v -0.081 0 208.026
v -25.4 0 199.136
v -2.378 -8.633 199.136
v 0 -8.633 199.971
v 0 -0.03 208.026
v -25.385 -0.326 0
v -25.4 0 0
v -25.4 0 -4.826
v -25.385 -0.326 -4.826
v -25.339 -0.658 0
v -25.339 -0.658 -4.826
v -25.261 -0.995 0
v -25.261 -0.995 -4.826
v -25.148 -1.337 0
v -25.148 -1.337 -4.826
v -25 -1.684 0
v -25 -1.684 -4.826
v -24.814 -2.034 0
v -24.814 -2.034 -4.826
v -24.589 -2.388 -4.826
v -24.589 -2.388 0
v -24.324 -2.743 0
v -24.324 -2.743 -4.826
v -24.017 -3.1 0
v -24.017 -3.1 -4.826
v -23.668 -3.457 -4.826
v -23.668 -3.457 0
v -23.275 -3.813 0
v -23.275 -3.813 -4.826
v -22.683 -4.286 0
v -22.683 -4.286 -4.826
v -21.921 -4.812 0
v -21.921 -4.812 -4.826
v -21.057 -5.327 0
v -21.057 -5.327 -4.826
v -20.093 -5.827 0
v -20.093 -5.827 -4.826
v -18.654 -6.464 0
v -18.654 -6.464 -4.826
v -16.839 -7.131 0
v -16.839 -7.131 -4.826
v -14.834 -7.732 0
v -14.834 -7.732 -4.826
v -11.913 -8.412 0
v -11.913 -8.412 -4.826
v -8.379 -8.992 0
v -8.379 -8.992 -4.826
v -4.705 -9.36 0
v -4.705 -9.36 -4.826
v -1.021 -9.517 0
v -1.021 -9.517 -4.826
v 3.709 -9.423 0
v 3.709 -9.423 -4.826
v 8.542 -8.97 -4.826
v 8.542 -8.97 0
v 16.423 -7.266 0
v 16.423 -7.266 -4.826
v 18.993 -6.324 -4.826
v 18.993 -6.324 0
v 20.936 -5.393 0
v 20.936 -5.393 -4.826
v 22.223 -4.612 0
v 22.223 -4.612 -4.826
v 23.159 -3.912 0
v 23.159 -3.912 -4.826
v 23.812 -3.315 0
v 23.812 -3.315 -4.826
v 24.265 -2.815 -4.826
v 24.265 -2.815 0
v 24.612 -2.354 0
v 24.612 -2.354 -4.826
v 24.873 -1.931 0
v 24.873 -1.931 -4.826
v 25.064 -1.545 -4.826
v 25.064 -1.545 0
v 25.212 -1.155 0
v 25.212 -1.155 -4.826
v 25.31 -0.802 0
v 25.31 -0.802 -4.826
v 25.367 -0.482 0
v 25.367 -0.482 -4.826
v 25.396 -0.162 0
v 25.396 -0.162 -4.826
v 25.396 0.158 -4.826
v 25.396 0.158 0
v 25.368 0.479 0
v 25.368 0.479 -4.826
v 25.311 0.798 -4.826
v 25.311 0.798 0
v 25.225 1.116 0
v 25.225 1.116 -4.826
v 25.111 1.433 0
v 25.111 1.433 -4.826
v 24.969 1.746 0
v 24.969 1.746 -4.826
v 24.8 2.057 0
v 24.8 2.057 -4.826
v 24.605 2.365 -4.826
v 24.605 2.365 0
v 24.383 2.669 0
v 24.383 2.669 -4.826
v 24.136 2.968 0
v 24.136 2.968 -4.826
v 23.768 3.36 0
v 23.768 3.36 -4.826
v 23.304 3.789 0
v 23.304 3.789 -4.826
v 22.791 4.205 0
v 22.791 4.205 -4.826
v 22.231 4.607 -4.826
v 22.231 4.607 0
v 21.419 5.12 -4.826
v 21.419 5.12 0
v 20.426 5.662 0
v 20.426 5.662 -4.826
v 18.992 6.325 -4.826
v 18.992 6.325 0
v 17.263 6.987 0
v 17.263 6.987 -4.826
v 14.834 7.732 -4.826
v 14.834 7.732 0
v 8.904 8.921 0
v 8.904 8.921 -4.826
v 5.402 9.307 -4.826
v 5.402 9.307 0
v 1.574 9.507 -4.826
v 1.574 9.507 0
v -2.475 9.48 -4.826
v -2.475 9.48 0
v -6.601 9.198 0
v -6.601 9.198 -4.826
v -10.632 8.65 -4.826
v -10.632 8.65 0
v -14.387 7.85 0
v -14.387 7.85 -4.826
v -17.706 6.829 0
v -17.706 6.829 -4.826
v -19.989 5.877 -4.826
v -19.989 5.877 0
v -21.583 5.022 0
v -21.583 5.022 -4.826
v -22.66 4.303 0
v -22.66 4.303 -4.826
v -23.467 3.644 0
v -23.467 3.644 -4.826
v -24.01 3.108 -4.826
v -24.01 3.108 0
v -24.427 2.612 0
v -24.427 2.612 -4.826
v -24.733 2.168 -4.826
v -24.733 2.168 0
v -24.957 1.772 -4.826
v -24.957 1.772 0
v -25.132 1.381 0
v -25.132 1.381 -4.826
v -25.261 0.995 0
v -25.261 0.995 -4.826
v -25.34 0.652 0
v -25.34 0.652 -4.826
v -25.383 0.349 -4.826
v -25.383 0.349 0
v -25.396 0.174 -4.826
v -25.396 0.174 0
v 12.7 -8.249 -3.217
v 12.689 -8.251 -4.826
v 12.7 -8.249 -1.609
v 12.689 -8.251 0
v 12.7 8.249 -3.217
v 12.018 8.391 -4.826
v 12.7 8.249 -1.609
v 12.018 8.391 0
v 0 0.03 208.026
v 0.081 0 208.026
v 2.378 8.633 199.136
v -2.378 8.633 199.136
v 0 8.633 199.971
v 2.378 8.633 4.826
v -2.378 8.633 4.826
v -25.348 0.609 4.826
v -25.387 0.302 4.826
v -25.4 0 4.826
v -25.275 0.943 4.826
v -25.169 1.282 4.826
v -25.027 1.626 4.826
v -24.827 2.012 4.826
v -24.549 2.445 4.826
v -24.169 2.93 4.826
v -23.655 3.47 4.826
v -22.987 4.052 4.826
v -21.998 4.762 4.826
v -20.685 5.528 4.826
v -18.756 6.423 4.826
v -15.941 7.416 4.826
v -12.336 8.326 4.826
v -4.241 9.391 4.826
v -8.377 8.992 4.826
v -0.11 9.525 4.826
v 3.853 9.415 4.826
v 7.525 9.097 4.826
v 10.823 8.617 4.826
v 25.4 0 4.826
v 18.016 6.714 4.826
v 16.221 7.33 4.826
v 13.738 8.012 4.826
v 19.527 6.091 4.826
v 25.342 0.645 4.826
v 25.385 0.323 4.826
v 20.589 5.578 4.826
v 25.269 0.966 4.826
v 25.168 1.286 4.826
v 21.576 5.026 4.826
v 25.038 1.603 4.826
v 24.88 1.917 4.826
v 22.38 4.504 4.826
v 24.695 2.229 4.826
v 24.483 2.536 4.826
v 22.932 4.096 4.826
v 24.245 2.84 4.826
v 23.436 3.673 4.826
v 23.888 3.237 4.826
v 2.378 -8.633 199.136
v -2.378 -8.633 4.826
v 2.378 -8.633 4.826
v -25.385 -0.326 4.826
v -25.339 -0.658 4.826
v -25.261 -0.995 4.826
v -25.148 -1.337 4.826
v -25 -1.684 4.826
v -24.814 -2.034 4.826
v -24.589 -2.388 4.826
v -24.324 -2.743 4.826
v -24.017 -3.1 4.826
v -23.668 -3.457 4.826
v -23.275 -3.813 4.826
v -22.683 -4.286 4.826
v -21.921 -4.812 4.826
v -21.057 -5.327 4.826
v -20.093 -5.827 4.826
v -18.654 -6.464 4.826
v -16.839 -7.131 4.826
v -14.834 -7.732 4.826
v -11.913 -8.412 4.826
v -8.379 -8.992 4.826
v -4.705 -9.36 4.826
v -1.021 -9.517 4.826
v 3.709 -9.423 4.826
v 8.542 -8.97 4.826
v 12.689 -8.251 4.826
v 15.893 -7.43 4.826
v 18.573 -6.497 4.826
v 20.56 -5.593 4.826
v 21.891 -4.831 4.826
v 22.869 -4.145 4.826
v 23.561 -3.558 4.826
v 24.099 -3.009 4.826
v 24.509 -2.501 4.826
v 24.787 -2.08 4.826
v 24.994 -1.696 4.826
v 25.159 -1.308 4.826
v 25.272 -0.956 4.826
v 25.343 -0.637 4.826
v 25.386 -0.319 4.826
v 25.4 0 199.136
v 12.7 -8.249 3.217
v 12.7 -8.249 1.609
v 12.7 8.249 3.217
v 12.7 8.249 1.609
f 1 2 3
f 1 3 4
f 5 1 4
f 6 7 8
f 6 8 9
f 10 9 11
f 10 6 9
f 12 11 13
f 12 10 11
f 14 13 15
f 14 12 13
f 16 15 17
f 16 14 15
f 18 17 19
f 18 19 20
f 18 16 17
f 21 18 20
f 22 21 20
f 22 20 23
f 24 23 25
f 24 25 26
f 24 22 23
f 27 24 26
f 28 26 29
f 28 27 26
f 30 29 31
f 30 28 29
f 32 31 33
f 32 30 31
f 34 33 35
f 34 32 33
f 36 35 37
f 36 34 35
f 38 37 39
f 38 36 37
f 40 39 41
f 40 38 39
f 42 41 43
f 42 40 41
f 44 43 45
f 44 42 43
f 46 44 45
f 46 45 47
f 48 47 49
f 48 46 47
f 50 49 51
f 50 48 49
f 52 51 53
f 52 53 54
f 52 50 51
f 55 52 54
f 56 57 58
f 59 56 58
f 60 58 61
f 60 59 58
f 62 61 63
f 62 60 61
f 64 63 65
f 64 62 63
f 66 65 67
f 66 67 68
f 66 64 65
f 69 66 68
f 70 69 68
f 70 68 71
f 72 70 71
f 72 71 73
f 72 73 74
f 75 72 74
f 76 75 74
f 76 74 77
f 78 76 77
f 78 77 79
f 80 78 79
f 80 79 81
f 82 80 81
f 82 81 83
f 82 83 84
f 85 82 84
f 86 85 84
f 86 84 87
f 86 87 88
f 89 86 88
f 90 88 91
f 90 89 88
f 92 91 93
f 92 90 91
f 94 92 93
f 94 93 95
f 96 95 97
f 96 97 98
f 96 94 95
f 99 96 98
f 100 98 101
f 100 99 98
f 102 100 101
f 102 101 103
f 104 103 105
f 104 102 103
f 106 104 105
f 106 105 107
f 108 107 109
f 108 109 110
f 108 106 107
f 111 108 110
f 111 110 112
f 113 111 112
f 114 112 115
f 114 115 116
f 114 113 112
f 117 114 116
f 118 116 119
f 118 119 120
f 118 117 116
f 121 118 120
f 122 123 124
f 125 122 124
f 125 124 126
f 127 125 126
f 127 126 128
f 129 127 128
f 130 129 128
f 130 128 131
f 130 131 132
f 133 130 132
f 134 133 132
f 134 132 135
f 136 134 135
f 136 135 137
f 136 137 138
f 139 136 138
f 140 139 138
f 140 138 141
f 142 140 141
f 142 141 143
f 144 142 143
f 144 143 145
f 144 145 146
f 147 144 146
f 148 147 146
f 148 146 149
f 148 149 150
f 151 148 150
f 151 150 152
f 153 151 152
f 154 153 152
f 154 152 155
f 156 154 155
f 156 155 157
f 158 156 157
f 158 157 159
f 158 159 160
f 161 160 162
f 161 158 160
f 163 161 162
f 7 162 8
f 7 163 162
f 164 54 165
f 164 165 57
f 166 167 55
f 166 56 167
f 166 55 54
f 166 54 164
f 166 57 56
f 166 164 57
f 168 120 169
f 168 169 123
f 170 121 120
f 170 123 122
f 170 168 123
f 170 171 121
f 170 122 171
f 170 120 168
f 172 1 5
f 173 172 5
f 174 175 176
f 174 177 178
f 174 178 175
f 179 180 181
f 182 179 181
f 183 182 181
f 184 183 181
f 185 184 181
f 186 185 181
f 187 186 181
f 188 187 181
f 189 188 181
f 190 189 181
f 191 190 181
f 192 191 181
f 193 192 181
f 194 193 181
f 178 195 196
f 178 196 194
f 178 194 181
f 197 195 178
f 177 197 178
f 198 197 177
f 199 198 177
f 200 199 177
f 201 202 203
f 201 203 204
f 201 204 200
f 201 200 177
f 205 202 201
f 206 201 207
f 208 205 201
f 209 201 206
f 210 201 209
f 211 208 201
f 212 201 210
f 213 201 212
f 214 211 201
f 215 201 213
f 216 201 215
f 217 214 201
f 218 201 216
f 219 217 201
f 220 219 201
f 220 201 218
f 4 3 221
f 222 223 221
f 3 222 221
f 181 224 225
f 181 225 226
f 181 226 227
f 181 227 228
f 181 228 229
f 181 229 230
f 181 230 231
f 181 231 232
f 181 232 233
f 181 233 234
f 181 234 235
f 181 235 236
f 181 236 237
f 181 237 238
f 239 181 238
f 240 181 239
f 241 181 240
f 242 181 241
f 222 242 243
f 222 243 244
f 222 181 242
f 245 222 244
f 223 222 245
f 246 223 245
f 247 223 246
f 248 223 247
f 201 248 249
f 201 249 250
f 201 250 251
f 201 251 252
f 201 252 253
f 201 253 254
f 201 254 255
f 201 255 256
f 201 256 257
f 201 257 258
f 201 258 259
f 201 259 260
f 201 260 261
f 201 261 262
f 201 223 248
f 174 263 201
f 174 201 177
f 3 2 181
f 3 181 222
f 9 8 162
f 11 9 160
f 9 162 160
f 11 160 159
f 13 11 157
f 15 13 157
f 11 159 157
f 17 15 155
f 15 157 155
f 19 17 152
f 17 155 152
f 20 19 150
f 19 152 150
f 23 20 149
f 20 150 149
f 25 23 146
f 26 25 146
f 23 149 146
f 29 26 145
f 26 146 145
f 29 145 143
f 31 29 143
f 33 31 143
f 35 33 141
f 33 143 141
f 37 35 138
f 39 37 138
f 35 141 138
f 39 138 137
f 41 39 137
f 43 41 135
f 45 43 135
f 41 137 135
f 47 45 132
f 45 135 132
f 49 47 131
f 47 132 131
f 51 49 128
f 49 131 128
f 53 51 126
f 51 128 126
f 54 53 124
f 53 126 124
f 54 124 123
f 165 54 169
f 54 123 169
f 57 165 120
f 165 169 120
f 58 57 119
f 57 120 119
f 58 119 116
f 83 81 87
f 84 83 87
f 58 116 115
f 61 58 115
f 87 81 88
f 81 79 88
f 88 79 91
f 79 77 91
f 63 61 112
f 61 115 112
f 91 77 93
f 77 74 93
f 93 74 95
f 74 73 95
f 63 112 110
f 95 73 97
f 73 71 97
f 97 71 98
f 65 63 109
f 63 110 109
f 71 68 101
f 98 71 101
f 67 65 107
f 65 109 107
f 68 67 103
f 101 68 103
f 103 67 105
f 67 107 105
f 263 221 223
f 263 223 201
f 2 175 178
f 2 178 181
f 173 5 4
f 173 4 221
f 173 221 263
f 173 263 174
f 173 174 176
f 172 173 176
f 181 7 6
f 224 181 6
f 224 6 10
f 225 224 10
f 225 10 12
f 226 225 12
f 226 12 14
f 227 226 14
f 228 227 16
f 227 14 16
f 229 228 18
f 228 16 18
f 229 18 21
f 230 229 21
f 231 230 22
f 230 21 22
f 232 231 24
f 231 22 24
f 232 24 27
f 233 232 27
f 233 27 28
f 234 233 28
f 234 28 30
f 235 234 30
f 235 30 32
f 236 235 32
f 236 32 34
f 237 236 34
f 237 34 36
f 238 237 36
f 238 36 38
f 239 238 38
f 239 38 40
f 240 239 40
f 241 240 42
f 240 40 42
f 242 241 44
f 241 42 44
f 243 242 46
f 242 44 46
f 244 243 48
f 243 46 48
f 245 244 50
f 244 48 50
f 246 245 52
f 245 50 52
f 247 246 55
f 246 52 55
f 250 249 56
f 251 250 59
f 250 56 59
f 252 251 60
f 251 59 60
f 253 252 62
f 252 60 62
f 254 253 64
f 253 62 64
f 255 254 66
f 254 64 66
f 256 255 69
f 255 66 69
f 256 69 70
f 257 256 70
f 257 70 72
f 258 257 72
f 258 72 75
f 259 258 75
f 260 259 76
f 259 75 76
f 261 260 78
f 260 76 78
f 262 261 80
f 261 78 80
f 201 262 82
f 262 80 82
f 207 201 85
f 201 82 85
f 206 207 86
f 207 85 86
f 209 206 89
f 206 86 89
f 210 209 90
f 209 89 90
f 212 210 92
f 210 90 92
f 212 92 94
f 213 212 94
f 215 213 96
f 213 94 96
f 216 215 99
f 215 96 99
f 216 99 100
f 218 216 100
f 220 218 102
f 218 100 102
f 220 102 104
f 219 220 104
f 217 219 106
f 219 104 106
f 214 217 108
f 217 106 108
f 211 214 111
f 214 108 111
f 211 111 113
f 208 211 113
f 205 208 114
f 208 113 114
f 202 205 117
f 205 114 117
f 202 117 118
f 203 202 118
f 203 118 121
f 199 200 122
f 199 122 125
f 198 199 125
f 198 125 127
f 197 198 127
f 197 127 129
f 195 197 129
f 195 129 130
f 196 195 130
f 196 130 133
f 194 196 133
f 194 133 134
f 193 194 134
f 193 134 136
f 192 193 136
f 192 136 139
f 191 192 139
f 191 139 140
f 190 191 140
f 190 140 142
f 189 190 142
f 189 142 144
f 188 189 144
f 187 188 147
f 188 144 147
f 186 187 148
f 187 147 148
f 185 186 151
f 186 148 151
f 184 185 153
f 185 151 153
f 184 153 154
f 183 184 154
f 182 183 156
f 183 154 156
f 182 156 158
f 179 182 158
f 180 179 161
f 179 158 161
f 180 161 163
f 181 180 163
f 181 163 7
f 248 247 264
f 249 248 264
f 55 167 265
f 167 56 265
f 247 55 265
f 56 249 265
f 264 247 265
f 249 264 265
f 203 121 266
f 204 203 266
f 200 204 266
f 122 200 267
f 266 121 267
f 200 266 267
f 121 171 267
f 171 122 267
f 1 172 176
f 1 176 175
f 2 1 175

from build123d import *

# Parameters (mm, degrees)
F1_DEPTH = 4.826
F3_DEPTH = 203.2
F4_SIZE  = 8.89
F5_SIZE  = 2.54


with BuildPart() as f1:
    # F0 (on Top) → F1 (new body, symmetric)
    with BuildSketch(Plane.XY):
        with BuildLine():
            add(Edge.make_bspline(
                [(-25.4, 0), (-25.4, -16.4977839421), (12.7, -8.248891971), (50.8, 0), (12.7, 8.248891971), (-25.4, 16.4977839421), (-25.4, 0)],
                knots=[0, 0, 0, 2.0943951024, 2.0943951024, 4.1887902048, 4.1887902048, 6.2831853072, 6.2831853072, 6.2831853072], degree=2, weights=[1, 0.5, 1, 0.5, 1, 0.5, 1]))
        make_face()
    extrude(amount=F1_DEPTH, both=True)

    # F2 (on face) → F3 (join)
    with BuildSketch(Plane.XY.offset(4.826)):
        Polygon((0, 9.525), (-25.4, 0), (0, -9.525), (25.4, 0), align=None)
    extrude(amount=F3_DEPTH)

    # F4
    f4_edges = [f1.edges().sort_by_distance(p)[0] for p in [
        (-12.7, 4.7625, 208.026),
        (-12.7, -4.7625, 208.026),
        (12.7, -4.7625, 208.026),
        (12.7, 4.7625, 208.026),
    ]]
    chamfer(f4_edges, length=F4_SIZE)

    # F5
    f5_edges = [f1.edges().sort_by_distance(p)[0] for p in [
        (0, -9.525, 101.981),
        (0, 9.525, 101.981),
    ]]
    chamfer(f5_edges, length=F5_SIZE)


solid = f1.part
